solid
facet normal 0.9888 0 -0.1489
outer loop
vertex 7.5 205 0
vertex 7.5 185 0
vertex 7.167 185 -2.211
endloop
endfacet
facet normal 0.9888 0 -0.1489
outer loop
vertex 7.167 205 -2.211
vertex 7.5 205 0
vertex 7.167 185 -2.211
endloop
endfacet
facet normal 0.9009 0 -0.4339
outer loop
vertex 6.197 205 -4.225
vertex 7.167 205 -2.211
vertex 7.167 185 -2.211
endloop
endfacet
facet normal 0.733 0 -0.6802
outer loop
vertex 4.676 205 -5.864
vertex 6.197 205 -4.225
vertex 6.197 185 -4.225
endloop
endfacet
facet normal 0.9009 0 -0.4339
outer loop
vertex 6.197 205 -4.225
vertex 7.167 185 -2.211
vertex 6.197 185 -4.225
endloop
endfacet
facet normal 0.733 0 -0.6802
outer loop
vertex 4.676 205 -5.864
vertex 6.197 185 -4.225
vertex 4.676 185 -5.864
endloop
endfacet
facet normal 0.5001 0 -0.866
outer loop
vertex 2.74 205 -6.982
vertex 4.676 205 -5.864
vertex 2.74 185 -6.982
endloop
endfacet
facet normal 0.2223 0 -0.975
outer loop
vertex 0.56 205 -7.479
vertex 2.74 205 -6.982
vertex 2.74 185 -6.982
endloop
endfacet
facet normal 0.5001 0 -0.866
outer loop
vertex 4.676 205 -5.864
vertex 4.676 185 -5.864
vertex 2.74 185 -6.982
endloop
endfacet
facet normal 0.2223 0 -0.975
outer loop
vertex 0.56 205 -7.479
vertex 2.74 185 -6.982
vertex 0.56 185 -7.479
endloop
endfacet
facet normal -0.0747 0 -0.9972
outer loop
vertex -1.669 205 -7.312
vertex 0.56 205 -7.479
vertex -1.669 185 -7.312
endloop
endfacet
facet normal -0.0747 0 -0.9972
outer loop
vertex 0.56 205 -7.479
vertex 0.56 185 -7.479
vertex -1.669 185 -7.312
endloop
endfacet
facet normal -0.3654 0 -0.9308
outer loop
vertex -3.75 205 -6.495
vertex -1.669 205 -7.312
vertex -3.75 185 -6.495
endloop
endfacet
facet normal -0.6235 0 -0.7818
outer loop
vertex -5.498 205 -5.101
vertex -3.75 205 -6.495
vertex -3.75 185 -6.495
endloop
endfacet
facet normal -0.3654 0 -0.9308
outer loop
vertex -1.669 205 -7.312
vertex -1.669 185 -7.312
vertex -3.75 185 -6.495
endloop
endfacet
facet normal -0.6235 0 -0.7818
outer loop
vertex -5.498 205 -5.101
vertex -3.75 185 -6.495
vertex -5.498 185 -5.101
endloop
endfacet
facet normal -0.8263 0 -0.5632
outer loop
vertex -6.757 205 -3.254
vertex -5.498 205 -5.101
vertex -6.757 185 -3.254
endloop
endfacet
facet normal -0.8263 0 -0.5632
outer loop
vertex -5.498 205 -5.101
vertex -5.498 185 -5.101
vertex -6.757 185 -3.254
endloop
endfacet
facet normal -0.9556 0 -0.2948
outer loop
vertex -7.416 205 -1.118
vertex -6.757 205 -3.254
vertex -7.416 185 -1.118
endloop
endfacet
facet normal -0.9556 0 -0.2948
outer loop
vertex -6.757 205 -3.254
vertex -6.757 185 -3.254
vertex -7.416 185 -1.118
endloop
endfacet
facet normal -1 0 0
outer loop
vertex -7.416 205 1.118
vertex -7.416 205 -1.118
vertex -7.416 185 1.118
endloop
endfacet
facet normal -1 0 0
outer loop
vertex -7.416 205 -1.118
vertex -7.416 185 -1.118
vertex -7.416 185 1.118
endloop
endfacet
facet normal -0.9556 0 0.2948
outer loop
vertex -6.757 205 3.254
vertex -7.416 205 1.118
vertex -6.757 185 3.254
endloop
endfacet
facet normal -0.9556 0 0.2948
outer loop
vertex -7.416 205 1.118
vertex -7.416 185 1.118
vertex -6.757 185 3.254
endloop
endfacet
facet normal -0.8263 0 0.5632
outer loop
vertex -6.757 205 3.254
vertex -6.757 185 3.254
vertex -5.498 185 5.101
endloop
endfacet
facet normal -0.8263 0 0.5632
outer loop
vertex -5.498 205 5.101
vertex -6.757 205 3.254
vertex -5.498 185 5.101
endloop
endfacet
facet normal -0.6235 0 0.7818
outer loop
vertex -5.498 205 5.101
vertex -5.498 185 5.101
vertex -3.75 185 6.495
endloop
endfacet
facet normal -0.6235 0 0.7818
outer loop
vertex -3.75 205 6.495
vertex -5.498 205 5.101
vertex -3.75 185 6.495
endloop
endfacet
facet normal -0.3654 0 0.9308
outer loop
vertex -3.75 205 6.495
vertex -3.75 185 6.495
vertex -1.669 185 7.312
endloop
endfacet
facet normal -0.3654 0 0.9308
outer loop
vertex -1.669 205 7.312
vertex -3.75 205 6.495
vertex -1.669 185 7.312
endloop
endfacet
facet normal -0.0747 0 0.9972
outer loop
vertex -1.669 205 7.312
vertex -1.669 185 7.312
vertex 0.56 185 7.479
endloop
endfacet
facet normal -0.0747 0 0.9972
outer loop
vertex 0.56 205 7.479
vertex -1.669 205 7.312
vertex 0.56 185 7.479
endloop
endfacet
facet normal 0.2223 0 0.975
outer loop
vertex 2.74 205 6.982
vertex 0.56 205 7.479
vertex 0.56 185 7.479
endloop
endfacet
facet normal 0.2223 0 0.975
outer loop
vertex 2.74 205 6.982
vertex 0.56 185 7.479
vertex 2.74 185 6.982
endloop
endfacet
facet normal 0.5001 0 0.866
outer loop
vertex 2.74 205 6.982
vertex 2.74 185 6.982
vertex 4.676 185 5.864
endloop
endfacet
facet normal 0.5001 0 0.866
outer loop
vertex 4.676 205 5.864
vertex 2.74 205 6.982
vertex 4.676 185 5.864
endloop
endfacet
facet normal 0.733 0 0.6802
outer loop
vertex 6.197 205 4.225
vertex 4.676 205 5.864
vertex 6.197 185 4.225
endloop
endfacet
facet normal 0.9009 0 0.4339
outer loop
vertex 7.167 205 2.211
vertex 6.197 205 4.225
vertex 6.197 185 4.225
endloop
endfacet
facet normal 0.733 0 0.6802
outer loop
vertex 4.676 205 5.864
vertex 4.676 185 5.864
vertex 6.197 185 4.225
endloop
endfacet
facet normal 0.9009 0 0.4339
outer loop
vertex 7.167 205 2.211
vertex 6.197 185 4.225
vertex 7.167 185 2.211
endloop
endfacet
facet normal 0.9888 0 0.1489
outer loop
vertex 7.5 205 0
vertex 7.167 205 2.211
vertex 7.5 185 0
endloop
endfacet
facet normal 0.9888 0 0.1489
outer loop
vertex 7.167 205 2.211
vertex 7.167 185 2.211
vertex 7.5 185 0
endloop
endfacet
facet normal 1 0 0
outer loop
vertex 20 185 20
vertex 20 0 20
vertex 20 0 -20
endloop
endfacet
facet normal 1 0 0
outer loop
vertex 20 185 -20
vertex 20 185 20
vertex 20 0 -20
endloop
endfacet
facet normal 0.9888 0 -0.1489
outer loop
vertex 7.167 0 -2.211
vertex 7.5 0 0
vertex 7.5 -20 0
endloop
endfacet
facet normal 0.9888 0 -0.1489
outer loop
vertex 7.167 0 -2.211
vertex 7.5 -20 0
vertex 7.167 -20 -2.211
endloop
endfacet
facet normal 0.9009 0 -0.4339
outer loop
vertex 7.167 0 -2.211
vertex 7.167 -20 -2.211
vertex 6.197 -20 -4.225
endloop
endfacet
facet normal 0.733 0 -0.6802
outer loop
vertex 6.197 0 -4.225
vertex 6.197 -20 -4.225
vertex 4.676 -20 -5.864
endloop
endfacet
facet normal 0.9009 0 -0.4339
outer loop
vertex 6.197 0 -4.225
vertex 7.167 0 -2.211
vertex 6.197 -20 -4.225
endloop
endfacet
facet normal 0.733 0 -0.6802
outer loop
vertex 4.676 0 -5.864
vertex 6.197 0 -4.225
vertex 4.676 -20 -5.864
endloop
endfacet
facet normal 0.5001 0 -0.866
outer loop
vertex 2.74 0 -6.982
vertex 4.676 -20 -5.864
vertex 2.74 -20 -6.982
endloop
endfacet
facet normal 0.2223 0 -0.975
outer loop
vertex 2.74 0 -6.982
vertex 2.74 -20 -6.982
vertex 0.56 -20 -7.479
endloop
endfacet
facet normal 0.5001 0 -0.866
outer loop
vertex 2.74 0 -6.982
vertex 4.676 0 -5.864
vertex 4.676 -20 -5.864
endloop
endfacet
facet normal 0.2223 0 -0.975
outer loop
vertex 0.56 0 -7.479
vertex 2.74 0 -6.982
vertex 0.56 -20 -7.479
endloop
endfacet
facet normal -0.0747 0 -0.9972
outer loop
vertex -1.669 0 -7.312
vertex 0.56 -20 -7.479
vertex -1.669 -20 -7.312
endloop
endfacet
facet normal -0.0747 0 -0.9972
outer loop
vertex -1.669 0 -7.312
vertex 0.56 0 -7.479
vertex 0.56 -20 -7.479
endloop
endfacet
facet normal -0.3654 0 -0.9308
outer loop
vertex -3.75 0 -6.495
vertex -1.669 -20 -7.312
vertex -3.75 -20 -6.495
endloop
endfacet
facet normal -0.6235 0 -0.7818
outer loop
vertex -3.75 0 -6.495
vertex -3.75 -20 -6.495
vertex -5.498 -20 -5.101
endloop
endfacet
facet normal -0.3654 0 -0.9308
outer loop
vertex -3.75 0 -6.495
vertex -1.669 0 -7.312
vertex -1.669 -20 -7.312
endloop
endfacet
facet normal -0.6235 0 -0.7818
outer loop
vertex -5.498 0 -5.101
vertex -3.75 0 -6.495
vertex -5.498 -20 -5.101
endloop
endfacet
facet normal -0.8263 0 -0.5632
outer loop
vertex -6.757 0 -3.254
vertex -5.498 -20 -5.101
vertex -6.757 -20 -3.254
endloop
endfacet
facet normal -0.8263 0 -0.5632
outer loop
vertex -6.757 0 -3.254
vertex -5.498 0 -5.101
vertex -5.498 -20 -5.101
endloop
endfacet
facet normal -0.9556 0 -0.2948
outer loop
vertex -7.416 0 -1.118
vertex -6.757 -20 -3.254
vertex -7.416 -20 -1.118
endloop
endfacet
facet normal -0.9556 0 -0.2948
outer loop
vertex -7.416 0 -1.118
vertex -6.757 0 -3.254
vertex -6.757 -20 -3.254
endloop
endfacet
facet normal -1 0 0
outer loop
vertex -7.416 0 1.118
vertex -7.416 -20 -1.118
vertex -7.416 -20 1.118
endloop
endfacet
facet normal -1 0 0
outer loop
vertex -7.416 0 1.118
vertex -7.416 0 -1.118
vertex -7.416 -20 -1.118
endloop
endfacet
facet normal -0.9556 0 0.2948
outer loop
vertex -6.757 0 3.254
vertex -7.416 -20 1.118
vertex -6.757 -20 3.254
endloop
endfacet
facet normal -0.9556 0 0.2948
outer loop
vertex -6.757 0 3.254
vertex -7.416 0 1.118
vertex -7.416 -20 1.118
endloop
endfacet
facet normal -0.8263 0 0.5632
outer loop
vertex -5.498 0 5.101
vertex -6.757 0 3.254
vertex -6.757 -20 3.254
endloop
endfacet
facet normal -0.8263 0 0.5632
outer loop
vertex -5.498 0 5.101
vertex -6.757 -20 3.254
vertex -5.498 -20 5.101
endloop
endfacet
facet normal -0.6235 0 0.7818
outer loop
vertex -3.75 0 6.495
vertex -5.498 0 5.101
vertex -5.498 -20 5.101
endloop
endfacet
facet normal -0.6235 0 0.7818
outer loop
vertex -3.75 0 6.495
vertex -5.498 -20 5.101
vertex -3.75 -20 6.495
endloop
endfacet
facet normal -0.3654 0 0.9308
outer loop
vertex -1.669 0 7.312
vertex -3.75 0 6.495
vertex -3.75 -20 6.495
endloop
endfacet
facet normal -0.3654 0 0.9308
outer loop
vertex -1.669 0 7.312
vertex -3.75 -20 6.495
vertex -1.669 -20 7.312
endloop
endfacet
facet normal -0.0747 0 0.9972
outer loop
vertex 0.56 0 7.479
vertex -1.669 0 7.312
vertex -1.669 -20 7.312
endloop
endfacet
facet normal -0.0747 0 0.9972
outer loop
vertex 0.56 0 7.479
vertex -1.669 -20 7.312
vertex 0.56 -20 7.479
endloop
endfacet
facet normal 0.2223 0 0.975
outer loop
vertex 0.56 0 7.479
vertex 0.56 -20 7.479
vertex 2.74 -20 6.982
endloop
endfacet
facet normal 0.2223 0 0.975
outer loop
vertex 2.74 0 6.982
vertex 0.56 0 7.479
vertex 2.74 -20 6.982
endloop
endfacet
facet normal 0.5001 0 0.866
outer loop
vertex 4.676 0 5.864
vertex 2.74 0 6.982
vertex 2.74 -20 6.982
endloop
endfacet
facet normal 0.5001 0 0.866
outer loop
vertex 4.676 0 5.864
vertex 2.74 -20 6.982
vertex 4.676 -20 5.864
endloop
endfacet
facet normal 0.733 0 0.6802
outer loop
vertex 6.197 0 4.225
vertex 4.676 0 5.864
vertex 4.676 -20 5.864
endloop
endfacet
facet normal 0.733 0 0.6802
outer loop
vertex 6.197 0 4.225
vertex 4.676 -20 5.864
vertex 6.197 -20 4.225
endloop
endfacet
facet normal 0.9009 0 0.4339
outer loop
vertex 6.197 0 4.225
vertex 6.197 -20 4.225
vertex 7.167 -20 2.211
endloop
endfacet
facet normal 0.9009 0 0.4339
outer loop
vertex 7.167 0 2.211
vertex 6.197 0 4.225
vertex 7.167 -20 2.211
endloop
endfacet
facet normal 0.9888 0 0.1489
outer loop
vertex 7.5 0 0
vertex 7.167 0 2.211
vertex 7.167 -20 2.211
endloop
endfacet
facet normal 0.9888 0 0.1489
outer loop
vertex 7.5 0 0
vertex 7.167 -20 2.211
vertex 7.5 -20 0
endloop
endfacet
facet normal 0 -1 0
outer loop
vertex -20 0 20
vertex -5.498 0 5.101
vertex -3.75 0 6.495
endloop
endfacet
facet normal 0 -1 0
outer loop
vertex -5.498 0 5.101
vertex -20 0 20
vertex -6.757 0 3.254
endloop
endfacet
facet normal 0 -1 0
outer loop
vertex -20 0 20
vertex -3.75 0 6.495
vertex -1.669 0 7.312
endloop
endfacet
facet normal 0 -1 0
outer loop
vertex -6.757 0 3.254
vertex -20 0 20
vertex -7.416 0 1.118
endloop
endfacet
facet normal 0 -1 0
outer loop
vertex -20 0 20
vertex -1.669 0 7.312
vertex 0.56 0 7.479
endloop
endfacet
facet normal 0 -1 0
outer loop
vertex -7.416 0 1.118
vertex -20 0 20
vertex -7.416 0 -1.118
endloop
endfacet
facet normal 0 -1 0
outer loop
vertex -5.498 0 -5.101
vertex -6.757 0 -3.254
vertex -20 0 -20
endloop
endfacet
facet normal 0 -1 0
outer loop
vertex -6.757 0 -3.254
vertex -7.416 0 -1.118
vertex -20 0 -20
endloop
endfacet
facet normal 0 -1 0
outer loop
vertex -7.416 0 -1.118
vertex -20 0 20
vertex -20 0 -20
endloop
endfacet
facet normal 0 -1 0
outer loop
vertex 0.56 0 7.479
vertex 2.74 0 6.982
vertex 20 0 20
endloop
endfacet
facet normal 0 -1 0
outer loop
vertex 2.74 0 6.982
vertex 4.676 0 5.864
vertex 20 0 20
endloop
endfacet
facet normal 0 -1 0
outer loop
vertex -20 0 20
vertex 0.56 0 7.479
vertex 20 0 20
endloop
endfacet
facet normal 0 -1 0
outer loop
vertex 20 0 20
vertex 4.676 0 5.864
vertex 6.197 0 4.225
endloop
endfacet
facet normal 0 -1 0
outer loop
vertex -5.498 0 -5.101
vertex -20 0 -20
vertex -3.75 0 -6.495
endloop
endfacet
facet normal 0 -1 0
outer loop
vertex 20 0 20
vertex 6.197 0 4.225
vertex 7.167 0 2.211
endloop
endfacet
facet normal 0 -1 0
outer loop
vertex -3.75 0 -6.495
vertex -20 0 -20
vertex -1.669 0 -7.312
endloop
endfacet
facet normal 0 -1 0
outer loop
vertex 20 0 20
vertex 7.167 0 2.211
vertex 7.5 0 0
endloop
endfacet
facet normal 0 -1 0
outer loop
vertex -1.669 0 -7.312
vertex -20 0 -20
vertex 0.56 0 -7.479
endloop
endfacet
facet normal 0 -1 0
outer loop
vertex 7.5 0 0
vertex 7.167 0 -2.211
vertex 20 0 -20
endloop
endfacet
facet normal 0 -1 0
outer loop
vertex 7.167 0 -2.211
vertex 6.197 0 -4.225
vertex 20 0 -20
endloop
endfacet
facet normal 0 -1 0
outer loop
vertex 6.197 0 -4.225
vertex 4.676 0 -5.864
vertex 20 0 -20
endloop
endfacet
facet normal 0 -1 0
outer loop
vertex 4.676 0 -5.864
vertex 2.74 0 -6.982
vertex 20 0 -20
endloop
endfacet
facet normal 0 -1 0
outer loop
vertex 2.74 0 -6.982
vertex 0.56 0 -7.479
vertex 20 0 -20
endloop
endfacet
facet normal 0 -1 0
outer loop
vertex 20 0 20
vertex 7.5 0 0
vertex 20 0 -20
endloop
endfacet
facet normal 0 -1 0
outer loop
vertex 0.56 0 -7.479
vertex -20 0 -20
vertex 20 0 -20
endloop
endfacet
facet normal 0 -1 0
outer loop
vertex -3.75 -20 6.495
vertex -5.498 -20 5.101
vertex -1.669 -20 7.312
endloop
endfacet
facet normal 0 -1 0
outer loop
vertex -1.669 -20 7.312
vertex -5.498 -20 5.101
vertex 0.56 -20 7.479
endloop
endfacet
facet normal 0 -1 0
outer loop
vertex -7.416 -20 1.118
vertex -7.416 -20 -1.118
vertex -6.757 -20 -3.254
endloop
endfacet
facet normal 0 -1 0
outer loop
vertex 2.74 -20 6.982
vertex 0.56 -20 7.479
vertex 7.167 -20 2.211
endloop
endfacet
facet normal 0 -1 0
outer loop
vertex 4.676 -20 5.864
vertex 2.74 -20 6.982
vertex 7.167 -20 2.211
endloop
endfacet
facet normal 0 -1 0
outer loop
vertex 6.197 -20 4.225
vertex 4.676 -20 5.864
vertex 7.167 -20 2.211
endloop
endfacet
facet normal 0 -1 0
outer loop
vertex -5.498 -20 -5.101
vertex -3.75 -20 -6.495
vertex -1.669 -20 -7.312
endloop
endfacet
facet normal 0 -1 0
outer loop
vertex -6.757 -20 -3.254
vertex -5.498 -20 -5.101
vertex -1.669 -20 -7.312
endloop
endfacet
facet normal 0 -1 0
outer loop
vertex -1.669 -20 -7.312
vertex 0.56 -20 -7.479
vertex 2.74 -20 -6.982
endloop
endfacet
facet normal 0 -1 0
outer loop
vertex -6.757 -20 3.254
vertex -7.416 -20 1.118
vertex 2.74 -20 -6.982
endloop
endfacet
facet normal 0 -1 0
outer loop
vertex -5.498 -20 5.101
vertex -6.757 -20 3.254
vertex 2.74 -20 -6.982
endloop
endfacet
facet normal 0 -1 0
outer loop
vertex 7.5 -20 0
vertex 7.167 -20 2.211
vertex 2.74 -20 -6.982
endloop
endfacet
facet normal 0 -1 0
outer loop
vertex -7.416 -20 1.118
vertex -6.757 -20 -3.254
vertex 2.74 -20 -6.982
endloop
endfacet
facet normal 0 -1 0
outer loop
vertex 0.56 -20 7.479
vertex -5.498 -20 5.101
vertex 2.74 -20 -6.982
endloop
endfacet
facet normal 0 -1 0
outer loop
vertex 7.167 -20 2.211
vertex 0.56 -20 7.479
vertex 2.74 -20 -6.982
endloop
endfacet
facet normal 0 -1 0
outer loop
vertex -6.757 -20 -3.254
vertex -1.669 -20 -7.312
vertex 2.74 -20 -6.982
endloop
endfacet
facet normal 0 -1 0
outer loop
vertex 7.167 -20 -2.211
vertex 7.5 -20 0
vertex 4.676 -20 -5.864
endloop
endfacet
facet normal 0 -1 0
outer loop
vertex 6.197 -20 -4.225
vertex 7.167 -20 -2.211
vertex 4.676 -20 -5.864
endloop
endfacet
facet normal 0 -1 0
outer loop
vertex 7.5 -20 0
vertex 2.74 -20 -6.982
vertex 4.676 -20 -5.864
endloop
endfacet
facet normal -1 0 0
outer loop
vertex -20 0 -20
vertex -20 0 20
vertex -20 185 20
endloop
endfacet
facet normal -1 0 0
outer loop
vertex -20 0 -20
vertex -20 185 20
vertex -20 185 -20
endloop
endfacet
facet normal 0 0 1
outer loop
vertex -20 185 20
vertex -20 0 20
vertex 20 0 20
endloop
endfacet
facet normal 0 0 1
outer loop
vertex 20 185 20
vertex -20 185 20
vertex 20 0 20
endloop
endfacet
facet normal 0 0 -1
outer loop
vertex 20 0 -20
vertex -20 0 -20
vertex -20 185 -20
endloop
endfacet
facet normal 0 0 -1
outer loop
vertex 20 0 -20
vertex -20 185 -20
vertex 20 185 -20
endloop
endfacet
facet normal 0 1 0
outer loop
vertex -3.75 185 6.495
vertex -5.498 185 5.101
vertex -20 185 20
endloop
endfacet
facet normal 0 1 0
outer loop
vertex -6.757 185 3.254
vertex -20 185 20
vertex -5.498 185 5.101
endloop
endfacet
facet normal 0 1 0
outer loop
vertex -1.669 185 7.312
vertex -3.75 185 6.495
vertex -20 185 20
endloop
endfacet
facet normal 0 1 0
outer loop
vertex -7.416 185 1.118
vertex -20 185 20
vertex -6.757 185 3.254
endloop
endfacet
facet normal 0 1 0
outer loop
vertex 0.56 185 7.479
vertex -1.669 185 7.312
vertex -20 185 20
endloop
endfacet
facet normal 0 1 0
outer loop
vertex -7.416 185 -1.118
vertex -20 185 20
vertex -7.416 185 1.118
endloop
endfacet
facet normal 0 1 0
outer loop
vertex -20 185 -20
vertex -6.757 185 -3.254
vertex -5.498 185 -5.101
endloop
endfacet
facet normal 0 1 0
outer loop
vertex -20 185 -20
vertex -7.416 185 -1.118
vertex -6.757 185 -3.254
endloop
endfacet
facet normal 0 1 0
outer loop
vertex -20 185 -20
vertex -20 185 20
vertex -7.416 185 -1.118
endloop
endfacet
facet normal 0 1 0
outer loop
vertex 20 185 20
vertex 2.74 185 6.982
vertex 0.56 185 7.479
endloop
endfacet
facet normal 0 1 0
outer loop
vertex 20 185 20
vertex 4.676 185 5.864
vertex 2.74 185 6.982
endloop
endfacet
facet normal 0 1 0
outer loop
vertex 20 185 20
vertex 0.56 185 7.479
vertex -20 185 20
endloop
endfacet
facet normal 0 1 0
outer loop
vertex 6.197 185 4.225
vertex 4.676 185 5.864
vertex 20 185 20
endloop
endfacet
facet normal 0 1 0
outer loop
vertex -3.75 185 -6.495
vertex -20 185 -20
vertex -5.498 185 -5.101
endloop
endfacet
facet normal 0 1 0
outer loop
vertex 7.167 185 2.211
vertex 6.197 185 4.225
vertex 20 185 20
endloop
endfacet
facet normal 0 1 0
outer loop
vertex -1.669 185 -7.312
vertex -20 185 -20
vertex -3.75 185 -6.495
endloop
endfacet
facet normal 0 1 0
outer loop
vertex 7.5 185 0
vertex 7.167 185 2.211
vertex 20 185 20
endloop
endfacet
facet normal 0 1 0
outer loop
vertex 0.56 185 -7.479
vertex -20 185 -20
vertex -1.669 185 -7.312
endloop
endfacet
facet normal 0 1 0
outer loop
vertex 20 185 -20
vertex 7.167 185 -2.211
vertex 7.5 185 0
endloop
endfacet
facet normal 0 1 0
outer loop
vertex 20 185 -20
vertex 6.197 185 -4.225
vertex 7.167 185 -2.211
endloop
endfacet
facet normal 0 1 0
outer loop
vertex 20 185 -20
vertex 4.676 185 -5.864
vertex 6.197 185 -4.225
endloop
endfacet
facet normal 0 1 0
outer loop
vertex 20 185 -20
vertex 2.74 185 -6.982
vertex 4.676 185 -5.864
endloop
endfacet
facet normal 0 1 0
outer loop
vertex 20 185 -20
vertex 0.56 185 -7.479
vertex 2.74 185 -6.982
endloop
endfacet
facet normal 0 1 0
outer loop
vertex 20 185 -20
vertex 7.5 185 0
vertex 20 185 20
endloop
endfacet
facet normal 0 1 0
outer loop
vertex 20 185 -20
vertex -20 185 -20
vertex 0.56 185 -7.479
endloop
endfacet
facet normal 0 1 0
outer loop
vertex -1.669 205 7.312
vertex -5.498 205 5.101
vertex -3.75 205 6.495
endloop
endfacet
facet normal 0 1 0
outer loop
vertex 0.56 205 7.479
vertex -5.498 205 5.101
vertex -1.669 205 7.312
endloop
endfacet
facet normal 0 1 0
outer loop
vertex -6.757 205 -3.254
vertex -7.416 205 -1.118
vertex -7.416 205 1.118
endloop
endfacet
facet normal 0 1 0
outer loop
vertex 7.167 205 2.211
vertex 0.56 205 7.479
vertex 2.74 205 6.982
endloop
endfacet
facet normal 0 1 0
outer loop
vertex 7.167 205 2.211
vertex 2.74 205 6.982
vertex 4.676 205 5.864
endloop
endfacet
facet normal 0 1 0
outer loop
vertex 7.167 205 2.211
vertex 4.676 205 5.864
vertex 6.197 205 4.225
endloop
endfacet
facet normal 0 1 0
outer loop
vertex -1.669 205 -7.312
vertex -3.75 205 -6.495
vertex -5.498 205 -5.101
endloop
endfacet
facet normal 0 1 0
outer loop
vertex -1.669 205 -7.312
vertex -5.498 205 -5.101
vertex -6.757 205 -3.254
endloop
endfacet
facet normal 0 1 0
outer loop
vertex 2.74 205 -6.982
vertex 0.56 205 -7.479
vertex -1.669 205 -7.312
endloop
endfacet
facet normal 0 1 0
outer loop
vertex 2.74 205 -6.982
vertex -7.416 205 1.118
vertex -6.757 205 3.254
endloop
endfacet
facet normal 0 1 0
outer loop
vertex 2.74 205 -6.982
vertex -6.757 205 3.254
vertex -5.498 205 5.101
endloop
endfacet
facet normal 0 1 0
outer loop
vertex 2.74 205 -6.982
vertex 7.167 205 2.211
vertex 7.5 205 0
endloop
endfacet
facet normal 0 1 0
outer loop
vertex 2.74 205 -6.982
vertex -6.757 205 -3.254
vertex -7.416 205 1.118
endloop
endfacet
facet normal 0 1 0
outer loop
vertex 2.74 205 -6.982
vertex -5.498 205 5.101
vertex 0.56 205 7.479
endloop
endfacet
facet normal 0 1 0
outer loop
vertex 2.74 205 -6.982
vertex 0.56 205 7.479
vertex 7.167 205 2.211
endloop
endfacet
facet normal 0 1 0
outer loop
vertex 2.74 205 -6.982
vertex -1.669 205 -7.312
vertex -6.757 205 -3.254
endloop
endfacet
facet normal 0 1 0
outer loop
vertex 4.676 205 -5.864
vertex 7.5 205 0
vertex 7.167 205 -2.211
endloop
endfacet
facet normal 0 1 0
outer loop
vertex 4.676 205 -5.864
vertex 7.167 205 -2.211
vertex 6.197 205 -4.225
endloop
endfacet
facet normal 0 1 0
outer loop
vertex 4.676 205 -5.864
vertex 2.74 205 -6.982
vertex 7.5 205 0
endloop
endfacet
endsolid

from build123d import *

# Parameters (mm, degrees)
SKETCH1_W                = 40
SKETCH1_H                = 40
BOSS_EXTRUDE1_DEPTH      = 185
SKETCH2_R                = 7.5
BOSS_EXTRUDE2_DEPTH      = 20
BOSS_EXTRUDE2_DEPTH_BACK = 205


with BuildPart() as part:
    # Sketch1 → Boss-Extrude1 (new body)
    with BuildSketch(Plane(origin=(0, 0, 0), x_dir=(1, 0, 0), z_dir=(0, 1, 0))):
        Rectangle(SKETCH1_W, SKETCH1_H)
    extrude(amount=BOSS_EXTRUDE1_DEPTH)

    # Sketch2 → Boss-Extrude2 (add, two sides)
    with BuildSketch(Plane(origin=(0, 185, 0), x_dir=(1, 0, 0), z_dir=(0, 1, 0))) as boss_extrude2_sk:
        Circle(SKETCH2_R)
    extrude(amount=BOSS_EXTRUDE2_DEPTH)
    extrude(boss_extrude2_sk.sketch, amount=-BOSS_EXTRUDE2_DEPTH_BACK)


solid = part.part
